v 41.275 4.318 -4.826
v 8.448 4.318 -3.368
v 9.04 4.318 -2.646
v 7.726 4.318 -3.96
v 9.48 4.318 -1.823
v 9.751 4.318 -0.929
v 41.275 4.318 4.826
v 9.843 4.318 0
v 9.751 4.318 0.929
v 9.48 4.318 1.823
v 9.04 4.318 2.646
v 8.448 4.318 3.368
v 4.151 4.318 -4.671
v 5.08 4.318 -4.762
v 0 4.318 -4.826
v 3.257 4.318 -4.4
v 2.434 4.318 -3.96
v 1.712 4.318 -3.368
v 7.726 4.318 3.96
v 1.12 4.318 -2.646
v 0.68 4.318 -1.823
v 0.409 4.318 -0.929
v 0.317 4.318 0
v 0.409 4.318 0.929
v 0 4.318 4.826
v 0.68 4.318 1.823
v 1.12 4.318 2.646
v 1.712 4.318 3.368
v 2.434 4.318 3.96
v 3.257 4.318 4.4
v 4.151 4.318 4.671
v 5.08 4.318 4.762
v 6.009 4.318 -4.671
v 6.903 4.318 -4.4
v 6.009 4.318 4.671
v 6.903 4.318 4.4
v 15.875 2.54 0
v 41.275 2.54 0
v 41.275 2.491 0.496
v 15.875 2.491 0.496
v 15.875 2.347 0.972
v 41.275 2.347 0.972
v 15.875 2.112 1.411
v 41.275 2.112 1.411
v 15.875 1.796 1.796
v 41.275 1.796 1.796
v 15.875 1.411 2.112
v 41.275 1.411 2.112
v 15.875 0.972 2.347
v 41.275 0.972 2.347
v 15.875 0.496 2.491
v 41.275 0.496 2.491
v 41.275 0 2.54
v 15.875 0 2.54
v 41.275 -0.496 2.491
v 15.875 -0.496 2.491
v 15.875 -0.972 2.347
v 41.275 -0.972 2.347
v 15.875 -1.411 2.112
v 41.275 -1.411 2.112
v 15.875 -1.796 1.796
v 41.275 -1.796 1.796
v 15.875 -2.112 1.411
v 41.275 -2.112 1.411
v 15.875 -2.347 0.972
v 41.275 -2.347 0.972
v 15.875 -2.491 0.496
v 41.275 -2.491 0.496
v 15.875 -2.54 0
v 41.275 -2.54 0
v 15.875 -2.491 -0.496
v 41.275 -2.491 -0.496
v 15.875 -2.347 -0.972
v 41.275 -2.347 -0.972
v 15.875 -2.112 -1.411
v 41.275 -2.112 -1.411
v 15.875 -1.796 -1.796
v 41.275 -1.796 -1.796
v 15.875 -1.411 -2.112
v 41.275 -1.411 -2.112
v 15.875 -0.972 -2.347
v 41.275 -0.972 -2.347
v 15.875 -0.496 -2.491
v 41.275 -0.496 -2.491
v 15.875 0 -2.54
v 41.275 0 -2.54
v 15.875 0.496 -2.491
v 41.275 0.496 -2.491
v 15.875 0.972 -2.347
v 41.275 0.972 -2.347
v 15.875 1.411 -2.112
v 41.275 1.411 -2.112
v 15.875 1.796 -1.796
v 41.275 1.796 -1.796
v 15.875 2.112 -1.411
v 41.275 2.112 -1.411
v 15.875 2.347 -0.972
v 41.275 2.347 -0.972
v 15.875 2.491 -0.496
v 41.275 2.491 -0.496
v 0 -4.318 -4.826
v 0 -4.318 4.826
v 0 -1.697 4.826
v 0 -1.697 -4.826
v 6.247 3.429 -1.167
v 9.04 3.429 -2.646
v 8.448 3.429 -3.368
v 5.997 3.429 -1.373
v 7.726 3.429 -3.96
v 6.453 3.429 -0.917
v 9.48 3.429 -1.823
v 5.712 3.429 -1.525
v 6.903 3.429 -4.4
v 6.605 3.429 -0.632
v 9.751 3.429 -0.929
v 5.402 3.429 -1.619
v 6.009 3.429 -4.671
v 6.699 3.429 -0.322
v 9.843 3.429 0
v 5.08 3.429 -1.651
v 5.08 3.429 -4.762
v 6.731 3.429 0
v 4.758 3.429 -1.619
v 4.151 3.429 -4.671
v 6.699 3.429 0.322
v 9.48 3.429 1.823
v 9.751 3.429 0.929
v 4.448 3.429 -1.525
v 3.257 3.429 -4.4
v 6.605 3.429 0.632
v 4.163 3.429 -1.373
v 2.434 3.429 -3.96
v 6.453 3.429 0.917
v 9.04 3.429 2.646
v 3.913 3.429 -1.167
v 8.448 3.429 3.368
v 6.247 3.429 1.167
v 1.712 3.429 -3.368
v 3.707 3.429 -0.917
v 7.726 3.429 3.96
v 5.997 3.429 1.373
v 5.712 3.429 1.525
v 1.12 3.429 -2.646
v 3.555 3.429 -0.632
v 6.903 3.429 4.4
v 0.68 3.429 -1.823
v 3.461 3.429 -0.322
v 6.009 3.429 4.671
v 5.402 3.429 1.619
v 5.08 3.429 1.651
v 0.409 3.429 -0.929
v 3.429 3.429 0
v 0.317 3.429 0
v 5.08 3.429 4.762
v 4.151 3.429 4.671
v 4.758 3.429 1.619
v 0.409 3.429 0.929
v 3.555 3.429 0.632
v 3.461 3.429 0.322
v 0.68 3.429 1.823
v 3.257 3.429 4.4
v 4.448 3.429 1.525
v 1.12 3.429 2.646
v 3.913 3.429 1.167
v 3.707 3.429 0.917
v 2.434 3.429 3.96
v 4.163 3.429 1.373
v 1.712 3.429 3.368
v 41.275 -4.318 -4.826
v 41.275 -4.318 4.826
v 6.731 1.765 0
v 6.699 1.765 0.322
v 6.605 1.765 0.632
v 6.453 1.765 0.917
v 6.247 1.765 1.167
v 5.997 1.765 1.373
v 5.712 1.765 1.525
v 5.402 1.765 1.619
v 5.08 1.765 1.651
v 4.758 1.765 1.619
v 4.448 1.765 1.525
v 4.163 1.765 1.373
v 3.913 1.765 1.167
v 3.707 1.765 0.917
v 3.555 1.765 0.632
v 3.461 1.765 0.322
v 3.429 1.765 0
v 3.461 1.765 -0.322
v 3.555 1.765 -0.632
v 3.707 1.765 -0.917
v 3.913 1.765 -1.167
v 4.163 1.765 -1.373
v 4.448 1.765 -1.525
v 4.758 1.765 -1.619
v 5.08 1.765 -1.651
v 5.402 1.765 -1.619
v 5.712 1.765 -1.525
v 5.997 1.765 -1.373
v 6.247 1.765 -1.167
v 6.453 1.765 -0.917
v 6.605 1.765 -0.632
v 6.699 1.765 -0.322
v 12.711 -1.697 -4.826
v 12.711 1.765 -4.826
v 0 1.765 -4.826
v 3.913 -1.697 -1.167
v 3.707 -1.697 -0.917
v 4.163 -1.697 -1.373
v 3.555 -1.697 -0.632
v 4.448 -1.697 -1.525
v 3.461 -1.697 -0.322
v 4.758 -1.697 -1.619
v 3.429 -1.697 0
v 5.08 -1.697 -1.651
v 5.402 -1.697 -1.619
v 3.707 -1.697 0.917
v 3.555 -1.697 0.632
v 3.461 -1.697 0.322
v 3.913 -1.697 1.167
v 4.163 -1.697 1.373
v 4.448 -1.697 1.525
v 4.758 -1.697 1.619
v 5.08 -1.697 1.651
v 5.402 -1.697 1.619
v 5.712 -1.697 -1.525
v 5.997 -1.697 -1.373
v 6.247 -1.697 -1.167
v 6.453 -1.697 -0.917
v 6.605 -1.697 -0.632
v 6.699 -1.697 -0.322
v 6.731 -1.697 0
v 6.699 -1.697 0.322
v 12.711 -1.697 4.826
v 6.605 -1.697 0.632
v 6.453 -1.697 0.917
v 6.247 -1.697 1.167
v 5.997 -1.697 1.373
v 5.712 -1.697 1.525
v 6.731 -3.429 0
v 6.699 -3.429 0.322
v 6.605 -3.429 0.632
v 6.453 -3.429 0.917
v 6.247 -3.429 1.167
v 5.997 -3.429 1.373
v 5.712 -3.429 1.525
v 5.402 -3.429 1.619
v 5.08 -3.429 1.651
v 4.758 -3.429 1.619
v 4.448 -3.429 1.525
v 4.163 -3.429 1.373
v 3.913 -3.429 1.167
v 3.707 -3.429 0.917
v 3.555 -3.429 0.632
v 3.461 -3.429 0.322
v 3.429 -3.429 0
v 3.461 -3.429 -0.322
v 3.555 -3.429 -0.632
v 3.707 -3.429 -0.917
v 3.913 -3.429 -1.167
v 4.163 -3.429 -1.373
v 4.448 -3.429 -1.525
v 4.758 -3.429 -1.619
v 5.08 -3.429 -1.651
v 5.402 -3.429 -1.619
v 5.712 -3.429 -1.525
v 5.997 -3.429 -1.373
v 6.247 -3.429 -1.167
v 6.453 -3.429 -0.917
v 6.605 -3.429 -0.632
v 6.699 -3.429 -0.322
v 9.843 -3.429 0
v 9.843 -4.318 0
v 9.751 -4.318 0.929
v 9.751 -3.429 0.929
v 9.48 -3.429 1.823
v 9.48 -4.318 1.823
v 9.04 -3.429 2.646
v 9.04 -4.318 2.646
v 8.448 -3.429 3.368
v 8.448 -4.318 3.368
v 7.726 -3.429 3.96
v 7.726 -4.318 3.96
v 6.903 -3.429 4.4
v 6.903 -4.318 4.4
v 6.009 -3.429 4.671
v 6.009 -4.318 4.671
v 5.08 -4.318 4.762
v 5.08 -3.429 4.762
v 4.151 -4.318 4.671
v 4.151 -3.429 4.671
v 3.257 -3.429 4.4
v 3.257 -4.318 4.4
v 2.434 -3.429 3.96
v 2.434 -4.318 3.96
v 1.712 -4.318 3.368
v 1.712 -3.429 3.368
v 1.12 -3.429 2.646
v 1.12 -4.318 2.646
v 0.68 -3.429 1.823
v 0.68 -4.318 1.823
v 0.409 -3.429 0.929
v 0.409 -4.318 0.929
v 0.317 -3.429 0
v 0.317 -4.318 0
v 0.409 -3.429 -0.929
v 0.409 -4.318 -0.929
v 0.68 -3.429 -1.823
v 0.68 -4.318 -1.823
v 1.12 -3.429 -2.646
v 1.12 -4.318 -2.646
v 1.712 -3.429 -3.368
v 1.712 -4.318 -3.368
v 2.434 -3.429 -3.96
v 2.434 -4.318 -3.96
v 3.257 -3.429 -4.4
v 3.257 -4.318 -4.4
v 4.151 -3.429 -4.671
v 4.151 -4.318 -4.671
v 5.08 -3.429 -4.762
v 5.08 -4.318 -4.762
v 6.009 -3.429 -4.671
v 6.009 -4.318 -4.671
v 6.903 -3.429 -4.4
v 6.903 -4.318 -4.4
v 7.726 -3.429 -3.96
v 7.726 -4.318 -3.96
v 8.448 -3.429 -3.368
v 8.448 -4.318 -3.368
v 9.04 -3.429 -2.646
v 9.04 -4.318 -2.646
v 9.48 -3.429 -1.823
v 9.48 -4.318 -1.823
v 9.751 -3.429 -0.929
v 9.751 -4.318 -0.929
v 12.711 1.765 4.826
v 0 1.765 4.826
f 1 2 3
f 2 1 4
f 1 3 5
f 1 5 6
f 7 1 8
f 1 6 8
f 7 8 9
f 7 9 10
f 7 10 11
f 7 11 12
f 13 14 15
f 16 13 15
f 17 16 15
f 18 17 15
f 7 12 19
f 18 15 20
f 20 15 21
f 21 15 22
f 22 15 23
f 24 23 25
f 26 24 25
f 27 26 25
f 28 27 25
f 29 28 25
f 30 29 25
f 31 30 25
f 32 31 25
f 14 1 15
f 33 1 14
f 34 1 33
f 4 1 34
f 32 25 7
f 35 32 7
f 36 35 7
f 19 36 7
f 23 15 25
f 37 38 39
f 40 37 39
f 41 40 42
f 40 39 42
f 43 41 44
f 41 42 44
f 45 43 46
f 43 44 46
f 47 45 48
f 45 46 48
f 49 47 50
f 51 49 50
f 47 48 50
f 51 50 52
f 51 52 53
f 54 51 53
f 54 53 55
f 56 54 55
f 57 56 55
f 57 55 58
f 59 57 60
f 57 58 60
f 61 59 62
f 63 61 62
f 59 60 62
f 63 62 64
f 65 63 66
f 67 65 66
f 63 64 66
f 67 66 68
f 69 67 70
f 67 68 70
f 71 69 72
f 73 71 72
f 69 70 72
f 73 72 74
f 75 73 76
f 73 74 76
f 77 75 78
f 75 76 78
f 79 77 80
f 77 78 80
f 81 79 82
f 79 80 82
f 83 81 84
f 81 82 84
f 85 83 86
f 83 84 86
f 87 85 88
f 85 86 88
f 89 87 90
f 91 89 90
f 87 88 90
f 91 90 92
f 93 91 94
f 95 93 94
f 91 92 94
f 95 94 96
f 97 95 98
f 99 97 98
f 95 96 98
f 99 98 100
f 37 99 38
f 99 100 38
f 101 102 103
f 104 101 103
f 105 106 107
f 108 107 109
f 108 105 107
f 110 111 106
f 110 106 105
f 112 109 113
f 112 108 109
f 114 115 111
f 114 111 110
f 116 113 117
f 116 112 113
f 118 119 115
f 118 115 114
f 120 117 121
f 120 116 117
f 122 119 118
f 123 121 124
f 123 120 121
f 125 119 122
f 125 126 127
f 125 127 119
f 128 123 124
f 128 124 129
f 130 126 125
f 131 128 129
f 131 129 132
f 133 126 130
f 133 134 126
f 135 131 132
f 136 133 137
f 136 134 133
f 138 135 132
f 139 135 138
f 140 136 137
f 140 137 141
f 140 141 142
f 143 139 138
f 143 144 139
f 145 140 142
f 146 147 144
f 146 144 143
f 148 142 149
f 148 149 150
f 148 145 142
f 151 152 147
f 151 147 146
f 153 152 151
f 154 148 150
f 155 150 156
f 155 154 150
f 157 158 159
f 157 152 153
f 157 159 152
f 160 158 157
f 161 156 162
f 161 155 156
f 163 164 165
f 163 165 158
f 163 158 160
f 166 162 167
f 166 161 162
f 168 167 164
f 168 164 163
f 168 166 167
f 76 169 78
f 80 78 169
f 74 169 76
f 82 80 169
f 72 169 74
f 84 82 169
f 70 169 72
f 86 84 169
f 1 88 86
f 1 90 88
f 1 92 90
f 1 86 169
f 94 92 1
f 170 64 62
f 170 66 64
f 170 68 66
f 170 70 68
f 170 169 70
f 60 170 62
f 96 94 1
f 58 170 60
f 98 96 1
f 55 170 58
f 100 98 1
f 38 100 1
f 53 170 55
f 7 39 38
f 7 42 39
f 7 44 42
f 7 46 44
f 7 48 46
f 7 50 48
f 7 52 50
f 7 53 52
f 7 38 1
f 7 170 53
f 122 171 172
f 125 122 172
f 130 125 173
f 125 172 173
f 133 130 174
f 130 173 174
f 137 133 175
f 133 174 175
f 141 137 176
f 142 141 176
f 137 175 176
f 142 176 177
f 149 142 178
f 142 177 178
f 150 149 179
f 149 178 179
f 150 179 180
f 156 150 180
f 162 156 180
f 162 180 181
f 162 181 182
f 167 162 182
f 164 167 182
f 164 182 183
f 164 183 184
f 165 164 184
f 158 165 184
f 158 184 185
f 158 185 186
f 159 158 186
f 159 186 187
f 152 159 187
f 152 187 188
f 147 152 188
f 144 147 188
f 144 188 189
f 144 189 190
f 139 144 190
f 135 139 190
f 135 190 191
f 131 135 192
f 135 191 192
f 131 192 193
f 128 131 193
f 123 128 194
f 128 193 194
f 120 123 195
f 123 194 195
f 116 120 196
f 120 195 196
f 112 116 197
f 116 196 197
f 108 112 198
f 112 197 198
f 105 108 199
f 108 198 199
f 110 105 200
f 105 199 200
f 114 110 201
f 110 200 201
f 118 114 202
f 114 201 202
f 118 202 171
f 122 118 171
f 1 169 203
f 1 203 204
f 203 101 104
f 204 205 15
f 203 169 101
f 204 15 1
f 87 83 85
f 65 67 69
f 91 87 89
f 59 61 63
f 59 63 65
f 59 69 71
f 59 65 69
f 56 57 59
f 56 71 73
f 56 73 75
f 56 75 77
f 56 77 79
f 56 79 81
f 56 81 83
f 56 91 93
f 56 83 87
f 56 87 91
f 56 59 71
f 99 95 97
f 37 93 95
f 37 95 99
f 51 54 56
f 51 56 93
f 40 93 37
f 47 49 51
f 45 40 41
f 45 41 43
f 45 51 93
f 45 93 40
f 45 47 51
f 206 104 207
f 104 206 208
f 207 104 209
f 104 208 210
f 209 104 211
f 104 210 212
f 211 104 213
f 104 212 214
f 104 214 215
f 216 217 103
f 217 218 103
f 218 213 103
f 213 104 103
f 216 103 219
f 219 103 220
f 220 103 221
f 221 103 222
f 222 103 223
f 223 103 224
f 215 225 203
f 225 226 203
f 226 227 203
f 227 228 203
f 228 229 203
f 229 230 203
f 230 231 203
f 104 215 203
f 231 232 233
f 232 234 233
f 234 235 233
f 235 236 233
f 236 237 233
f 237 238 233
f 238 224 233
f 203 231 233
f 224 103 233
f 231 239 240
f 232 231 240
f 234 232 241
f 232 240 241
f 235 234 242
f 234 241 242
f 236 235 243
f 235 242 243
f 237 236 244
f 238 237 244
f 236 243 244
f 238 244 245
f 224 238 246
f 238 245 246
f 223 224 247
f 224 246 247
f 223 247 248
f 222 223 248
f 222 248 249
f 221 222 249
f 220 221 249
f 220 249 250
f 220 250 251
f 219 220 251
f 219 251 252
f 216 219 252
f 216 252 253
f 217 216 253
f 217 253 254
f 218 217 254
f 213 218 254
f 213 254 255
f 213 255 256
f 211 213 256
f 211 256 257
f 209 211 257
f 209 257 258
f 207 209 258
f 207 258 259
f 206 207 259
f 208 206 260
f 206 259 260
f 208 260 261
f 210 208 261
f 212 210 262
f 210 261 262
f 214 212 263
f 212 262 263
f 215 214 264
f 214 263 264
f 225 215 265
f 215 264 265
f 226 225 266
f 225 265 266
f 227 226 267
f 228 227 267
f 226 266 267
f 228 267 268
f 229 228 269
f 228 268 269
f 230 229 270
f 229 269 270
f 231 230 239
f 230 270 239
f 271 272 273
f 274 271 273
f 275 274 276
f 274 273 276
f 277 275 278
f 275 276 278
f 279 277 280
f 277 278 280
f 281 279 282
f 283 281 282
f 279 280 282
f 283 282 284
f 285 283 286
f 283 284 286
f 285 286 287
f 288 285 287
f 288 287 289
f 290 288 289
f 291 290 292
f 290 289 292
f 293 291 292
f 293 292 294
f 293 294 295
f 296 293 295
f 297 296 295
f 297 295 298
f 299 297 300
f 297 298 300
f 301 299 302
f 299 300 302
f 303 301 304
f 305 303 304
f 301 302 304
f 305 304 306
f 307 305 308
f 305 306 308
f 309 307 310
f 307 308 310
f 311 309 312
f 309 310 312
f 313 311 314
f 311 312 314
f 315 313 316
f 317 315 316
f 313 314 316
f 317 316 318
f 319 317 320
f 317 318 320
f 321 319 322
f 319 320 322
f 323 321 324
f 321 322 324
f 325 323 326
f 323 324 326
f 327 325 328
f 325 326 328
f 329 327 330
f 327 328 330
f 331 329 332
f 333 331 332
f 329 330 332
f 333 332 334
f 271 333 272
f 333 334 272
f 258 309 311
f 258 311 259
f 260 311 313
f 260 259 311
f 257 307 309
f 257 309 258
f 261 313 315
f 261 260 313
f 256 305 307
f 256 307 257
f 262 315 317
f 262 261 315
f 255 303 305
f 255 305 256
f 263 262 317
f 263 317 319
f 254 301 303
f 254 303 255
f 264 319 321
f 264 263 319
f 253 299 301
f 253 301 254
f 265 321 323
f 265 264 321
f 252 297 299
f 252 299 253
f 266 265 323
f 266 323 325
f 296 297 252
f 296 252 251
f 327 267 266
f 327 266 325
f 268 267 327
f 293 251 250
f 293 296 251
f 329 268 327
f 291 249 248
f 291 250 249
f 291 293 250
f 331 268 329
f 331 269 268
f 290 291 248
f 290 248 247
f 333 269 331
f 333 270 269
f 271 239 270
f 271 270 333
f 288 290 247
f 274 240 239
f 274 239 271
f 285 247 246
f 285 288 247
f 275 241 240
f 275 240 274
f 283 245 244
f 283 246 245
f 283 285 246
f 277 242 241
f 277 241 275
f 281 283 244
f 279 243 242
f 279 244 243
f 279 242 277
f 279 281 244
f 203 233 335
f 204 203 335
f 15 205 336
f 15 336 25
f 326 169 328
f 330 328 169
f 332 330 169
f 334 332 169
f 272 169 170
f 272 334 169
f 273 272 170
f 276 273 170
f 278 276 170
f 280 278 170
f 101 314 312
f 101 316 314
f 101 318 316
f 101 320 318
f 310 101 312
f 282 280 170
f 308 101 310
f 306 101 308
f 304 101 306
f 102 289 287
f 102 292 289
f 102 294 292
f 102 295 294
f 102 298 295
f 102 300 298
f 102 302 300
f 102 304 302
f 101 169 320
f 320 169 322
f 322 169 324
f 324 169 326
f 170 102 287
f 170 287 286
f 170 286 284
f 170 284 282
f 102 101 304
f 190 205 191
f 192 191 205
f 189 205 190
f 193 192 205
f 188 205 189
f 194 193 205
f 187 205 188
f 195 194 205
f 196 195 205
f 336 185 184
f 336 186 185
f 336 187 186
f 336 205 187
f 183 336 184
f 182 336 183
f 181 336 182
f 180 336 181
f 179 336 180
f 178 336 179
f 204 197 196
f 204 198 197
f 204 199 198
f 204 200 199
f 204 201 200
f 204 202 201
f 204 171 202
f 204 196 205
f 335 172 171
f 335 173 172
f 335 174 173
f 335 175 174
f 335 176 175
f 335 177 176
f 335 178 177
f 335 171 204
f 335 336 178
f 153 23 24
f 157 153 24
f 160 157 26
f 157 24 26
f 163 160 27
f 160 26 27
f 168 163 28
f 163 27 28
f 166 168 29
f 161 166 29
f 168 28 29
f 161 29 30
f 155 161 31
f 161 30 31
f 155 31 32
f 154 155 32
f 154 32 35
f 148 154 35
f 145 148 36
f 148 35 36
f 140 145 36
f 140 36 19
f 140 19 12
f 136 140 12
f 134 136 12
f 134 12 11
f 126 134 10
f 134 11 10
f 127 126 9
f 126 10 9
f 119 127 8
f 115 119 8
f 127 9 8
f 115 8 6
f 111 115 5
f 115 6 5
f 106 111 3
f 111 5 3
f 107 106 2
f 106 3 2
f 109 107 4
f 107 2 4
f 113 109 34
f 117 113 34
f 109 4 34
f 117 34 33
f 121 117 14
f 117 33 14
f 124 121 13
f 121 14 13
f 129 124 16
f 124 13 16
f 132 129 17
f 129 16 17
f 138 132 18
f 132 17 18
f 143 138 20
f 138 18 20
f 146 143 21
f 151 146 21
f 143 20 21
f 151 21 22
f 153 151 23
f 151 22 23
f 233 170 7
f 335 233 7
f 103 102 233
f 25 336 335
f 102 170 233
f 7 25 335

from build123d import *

# Parameters (mm, degrees)
F0_W      = 8.636
F0_H      = 9.652
F1_DEPTH  = 41.275
F2_R      = 2.54
F3_DEPTH  = 25.4
F5_R      = 1.651
F6_DEPTH  = 8.636
F7_R      = 4.7625
F8_DEPTH  = 0.889
F9_R      = 4.7625
F10_DEPTH = 0.889
F4_W      = 12.710963
F4_H      = 3.461967
F11_DEPTH = 9.652


with BuildPart() as f1:
    # F0 (on Right) → F1 (new body)
    with BuildSketch(Plane.YZ):
        Rectangle(F0_W, F0_H)
    extrude(amount=F1_DEPTH)

    # F2 (on face) → F3 (cut)
    with BuildSketch(Plane.YZ.offset(41.275)):
        Circle(F2_R)
    extrude(amount=-F3_DEPTH, mode=Mode.SUBTRACT)

    # F5 (on face) → F6 (cut)
    with BuildSketch(Plane.XZ.offset(4.318)):
        with Locations((5.08, 0)):
            Circle(F5_R)
    extrude(amount=-F6_DEPTH, mode=Mode.SUBTRACT)

    # F7 (on face) → F8 (cut)
    with BuildSketch(Plane.XZ.offset(4.318)):
        with Locations((5.08, 0)):
            Circle(F7_R)
    extrude(amount=-F8_DEPTH, mode=Mode.SUBTRACT)

    # F9 (on face) → F10 (cut)
    with BuildSketch(Plane(origin=(0, 4.318, 0), x_dir=(-1, 0, 0), z_dir=(0, 1, 0))):
        with Locations((-5.08, 0)):
            Circle(F9_R)
    extrude(amount=-F10_DEPTH, mode=Mode.SUBTRACT)

    # F4 (on face) → F11 (cut)
    with BuildSketch(Plane.XY.offset(4.826)):
        with Locations((6.355481, 0.034316)):
            Rectangle(F4_W, F4_H)
    extrude(amount=-F11_DEPTH, mode=Mode.SUBTRACT)


solid = f1.part
